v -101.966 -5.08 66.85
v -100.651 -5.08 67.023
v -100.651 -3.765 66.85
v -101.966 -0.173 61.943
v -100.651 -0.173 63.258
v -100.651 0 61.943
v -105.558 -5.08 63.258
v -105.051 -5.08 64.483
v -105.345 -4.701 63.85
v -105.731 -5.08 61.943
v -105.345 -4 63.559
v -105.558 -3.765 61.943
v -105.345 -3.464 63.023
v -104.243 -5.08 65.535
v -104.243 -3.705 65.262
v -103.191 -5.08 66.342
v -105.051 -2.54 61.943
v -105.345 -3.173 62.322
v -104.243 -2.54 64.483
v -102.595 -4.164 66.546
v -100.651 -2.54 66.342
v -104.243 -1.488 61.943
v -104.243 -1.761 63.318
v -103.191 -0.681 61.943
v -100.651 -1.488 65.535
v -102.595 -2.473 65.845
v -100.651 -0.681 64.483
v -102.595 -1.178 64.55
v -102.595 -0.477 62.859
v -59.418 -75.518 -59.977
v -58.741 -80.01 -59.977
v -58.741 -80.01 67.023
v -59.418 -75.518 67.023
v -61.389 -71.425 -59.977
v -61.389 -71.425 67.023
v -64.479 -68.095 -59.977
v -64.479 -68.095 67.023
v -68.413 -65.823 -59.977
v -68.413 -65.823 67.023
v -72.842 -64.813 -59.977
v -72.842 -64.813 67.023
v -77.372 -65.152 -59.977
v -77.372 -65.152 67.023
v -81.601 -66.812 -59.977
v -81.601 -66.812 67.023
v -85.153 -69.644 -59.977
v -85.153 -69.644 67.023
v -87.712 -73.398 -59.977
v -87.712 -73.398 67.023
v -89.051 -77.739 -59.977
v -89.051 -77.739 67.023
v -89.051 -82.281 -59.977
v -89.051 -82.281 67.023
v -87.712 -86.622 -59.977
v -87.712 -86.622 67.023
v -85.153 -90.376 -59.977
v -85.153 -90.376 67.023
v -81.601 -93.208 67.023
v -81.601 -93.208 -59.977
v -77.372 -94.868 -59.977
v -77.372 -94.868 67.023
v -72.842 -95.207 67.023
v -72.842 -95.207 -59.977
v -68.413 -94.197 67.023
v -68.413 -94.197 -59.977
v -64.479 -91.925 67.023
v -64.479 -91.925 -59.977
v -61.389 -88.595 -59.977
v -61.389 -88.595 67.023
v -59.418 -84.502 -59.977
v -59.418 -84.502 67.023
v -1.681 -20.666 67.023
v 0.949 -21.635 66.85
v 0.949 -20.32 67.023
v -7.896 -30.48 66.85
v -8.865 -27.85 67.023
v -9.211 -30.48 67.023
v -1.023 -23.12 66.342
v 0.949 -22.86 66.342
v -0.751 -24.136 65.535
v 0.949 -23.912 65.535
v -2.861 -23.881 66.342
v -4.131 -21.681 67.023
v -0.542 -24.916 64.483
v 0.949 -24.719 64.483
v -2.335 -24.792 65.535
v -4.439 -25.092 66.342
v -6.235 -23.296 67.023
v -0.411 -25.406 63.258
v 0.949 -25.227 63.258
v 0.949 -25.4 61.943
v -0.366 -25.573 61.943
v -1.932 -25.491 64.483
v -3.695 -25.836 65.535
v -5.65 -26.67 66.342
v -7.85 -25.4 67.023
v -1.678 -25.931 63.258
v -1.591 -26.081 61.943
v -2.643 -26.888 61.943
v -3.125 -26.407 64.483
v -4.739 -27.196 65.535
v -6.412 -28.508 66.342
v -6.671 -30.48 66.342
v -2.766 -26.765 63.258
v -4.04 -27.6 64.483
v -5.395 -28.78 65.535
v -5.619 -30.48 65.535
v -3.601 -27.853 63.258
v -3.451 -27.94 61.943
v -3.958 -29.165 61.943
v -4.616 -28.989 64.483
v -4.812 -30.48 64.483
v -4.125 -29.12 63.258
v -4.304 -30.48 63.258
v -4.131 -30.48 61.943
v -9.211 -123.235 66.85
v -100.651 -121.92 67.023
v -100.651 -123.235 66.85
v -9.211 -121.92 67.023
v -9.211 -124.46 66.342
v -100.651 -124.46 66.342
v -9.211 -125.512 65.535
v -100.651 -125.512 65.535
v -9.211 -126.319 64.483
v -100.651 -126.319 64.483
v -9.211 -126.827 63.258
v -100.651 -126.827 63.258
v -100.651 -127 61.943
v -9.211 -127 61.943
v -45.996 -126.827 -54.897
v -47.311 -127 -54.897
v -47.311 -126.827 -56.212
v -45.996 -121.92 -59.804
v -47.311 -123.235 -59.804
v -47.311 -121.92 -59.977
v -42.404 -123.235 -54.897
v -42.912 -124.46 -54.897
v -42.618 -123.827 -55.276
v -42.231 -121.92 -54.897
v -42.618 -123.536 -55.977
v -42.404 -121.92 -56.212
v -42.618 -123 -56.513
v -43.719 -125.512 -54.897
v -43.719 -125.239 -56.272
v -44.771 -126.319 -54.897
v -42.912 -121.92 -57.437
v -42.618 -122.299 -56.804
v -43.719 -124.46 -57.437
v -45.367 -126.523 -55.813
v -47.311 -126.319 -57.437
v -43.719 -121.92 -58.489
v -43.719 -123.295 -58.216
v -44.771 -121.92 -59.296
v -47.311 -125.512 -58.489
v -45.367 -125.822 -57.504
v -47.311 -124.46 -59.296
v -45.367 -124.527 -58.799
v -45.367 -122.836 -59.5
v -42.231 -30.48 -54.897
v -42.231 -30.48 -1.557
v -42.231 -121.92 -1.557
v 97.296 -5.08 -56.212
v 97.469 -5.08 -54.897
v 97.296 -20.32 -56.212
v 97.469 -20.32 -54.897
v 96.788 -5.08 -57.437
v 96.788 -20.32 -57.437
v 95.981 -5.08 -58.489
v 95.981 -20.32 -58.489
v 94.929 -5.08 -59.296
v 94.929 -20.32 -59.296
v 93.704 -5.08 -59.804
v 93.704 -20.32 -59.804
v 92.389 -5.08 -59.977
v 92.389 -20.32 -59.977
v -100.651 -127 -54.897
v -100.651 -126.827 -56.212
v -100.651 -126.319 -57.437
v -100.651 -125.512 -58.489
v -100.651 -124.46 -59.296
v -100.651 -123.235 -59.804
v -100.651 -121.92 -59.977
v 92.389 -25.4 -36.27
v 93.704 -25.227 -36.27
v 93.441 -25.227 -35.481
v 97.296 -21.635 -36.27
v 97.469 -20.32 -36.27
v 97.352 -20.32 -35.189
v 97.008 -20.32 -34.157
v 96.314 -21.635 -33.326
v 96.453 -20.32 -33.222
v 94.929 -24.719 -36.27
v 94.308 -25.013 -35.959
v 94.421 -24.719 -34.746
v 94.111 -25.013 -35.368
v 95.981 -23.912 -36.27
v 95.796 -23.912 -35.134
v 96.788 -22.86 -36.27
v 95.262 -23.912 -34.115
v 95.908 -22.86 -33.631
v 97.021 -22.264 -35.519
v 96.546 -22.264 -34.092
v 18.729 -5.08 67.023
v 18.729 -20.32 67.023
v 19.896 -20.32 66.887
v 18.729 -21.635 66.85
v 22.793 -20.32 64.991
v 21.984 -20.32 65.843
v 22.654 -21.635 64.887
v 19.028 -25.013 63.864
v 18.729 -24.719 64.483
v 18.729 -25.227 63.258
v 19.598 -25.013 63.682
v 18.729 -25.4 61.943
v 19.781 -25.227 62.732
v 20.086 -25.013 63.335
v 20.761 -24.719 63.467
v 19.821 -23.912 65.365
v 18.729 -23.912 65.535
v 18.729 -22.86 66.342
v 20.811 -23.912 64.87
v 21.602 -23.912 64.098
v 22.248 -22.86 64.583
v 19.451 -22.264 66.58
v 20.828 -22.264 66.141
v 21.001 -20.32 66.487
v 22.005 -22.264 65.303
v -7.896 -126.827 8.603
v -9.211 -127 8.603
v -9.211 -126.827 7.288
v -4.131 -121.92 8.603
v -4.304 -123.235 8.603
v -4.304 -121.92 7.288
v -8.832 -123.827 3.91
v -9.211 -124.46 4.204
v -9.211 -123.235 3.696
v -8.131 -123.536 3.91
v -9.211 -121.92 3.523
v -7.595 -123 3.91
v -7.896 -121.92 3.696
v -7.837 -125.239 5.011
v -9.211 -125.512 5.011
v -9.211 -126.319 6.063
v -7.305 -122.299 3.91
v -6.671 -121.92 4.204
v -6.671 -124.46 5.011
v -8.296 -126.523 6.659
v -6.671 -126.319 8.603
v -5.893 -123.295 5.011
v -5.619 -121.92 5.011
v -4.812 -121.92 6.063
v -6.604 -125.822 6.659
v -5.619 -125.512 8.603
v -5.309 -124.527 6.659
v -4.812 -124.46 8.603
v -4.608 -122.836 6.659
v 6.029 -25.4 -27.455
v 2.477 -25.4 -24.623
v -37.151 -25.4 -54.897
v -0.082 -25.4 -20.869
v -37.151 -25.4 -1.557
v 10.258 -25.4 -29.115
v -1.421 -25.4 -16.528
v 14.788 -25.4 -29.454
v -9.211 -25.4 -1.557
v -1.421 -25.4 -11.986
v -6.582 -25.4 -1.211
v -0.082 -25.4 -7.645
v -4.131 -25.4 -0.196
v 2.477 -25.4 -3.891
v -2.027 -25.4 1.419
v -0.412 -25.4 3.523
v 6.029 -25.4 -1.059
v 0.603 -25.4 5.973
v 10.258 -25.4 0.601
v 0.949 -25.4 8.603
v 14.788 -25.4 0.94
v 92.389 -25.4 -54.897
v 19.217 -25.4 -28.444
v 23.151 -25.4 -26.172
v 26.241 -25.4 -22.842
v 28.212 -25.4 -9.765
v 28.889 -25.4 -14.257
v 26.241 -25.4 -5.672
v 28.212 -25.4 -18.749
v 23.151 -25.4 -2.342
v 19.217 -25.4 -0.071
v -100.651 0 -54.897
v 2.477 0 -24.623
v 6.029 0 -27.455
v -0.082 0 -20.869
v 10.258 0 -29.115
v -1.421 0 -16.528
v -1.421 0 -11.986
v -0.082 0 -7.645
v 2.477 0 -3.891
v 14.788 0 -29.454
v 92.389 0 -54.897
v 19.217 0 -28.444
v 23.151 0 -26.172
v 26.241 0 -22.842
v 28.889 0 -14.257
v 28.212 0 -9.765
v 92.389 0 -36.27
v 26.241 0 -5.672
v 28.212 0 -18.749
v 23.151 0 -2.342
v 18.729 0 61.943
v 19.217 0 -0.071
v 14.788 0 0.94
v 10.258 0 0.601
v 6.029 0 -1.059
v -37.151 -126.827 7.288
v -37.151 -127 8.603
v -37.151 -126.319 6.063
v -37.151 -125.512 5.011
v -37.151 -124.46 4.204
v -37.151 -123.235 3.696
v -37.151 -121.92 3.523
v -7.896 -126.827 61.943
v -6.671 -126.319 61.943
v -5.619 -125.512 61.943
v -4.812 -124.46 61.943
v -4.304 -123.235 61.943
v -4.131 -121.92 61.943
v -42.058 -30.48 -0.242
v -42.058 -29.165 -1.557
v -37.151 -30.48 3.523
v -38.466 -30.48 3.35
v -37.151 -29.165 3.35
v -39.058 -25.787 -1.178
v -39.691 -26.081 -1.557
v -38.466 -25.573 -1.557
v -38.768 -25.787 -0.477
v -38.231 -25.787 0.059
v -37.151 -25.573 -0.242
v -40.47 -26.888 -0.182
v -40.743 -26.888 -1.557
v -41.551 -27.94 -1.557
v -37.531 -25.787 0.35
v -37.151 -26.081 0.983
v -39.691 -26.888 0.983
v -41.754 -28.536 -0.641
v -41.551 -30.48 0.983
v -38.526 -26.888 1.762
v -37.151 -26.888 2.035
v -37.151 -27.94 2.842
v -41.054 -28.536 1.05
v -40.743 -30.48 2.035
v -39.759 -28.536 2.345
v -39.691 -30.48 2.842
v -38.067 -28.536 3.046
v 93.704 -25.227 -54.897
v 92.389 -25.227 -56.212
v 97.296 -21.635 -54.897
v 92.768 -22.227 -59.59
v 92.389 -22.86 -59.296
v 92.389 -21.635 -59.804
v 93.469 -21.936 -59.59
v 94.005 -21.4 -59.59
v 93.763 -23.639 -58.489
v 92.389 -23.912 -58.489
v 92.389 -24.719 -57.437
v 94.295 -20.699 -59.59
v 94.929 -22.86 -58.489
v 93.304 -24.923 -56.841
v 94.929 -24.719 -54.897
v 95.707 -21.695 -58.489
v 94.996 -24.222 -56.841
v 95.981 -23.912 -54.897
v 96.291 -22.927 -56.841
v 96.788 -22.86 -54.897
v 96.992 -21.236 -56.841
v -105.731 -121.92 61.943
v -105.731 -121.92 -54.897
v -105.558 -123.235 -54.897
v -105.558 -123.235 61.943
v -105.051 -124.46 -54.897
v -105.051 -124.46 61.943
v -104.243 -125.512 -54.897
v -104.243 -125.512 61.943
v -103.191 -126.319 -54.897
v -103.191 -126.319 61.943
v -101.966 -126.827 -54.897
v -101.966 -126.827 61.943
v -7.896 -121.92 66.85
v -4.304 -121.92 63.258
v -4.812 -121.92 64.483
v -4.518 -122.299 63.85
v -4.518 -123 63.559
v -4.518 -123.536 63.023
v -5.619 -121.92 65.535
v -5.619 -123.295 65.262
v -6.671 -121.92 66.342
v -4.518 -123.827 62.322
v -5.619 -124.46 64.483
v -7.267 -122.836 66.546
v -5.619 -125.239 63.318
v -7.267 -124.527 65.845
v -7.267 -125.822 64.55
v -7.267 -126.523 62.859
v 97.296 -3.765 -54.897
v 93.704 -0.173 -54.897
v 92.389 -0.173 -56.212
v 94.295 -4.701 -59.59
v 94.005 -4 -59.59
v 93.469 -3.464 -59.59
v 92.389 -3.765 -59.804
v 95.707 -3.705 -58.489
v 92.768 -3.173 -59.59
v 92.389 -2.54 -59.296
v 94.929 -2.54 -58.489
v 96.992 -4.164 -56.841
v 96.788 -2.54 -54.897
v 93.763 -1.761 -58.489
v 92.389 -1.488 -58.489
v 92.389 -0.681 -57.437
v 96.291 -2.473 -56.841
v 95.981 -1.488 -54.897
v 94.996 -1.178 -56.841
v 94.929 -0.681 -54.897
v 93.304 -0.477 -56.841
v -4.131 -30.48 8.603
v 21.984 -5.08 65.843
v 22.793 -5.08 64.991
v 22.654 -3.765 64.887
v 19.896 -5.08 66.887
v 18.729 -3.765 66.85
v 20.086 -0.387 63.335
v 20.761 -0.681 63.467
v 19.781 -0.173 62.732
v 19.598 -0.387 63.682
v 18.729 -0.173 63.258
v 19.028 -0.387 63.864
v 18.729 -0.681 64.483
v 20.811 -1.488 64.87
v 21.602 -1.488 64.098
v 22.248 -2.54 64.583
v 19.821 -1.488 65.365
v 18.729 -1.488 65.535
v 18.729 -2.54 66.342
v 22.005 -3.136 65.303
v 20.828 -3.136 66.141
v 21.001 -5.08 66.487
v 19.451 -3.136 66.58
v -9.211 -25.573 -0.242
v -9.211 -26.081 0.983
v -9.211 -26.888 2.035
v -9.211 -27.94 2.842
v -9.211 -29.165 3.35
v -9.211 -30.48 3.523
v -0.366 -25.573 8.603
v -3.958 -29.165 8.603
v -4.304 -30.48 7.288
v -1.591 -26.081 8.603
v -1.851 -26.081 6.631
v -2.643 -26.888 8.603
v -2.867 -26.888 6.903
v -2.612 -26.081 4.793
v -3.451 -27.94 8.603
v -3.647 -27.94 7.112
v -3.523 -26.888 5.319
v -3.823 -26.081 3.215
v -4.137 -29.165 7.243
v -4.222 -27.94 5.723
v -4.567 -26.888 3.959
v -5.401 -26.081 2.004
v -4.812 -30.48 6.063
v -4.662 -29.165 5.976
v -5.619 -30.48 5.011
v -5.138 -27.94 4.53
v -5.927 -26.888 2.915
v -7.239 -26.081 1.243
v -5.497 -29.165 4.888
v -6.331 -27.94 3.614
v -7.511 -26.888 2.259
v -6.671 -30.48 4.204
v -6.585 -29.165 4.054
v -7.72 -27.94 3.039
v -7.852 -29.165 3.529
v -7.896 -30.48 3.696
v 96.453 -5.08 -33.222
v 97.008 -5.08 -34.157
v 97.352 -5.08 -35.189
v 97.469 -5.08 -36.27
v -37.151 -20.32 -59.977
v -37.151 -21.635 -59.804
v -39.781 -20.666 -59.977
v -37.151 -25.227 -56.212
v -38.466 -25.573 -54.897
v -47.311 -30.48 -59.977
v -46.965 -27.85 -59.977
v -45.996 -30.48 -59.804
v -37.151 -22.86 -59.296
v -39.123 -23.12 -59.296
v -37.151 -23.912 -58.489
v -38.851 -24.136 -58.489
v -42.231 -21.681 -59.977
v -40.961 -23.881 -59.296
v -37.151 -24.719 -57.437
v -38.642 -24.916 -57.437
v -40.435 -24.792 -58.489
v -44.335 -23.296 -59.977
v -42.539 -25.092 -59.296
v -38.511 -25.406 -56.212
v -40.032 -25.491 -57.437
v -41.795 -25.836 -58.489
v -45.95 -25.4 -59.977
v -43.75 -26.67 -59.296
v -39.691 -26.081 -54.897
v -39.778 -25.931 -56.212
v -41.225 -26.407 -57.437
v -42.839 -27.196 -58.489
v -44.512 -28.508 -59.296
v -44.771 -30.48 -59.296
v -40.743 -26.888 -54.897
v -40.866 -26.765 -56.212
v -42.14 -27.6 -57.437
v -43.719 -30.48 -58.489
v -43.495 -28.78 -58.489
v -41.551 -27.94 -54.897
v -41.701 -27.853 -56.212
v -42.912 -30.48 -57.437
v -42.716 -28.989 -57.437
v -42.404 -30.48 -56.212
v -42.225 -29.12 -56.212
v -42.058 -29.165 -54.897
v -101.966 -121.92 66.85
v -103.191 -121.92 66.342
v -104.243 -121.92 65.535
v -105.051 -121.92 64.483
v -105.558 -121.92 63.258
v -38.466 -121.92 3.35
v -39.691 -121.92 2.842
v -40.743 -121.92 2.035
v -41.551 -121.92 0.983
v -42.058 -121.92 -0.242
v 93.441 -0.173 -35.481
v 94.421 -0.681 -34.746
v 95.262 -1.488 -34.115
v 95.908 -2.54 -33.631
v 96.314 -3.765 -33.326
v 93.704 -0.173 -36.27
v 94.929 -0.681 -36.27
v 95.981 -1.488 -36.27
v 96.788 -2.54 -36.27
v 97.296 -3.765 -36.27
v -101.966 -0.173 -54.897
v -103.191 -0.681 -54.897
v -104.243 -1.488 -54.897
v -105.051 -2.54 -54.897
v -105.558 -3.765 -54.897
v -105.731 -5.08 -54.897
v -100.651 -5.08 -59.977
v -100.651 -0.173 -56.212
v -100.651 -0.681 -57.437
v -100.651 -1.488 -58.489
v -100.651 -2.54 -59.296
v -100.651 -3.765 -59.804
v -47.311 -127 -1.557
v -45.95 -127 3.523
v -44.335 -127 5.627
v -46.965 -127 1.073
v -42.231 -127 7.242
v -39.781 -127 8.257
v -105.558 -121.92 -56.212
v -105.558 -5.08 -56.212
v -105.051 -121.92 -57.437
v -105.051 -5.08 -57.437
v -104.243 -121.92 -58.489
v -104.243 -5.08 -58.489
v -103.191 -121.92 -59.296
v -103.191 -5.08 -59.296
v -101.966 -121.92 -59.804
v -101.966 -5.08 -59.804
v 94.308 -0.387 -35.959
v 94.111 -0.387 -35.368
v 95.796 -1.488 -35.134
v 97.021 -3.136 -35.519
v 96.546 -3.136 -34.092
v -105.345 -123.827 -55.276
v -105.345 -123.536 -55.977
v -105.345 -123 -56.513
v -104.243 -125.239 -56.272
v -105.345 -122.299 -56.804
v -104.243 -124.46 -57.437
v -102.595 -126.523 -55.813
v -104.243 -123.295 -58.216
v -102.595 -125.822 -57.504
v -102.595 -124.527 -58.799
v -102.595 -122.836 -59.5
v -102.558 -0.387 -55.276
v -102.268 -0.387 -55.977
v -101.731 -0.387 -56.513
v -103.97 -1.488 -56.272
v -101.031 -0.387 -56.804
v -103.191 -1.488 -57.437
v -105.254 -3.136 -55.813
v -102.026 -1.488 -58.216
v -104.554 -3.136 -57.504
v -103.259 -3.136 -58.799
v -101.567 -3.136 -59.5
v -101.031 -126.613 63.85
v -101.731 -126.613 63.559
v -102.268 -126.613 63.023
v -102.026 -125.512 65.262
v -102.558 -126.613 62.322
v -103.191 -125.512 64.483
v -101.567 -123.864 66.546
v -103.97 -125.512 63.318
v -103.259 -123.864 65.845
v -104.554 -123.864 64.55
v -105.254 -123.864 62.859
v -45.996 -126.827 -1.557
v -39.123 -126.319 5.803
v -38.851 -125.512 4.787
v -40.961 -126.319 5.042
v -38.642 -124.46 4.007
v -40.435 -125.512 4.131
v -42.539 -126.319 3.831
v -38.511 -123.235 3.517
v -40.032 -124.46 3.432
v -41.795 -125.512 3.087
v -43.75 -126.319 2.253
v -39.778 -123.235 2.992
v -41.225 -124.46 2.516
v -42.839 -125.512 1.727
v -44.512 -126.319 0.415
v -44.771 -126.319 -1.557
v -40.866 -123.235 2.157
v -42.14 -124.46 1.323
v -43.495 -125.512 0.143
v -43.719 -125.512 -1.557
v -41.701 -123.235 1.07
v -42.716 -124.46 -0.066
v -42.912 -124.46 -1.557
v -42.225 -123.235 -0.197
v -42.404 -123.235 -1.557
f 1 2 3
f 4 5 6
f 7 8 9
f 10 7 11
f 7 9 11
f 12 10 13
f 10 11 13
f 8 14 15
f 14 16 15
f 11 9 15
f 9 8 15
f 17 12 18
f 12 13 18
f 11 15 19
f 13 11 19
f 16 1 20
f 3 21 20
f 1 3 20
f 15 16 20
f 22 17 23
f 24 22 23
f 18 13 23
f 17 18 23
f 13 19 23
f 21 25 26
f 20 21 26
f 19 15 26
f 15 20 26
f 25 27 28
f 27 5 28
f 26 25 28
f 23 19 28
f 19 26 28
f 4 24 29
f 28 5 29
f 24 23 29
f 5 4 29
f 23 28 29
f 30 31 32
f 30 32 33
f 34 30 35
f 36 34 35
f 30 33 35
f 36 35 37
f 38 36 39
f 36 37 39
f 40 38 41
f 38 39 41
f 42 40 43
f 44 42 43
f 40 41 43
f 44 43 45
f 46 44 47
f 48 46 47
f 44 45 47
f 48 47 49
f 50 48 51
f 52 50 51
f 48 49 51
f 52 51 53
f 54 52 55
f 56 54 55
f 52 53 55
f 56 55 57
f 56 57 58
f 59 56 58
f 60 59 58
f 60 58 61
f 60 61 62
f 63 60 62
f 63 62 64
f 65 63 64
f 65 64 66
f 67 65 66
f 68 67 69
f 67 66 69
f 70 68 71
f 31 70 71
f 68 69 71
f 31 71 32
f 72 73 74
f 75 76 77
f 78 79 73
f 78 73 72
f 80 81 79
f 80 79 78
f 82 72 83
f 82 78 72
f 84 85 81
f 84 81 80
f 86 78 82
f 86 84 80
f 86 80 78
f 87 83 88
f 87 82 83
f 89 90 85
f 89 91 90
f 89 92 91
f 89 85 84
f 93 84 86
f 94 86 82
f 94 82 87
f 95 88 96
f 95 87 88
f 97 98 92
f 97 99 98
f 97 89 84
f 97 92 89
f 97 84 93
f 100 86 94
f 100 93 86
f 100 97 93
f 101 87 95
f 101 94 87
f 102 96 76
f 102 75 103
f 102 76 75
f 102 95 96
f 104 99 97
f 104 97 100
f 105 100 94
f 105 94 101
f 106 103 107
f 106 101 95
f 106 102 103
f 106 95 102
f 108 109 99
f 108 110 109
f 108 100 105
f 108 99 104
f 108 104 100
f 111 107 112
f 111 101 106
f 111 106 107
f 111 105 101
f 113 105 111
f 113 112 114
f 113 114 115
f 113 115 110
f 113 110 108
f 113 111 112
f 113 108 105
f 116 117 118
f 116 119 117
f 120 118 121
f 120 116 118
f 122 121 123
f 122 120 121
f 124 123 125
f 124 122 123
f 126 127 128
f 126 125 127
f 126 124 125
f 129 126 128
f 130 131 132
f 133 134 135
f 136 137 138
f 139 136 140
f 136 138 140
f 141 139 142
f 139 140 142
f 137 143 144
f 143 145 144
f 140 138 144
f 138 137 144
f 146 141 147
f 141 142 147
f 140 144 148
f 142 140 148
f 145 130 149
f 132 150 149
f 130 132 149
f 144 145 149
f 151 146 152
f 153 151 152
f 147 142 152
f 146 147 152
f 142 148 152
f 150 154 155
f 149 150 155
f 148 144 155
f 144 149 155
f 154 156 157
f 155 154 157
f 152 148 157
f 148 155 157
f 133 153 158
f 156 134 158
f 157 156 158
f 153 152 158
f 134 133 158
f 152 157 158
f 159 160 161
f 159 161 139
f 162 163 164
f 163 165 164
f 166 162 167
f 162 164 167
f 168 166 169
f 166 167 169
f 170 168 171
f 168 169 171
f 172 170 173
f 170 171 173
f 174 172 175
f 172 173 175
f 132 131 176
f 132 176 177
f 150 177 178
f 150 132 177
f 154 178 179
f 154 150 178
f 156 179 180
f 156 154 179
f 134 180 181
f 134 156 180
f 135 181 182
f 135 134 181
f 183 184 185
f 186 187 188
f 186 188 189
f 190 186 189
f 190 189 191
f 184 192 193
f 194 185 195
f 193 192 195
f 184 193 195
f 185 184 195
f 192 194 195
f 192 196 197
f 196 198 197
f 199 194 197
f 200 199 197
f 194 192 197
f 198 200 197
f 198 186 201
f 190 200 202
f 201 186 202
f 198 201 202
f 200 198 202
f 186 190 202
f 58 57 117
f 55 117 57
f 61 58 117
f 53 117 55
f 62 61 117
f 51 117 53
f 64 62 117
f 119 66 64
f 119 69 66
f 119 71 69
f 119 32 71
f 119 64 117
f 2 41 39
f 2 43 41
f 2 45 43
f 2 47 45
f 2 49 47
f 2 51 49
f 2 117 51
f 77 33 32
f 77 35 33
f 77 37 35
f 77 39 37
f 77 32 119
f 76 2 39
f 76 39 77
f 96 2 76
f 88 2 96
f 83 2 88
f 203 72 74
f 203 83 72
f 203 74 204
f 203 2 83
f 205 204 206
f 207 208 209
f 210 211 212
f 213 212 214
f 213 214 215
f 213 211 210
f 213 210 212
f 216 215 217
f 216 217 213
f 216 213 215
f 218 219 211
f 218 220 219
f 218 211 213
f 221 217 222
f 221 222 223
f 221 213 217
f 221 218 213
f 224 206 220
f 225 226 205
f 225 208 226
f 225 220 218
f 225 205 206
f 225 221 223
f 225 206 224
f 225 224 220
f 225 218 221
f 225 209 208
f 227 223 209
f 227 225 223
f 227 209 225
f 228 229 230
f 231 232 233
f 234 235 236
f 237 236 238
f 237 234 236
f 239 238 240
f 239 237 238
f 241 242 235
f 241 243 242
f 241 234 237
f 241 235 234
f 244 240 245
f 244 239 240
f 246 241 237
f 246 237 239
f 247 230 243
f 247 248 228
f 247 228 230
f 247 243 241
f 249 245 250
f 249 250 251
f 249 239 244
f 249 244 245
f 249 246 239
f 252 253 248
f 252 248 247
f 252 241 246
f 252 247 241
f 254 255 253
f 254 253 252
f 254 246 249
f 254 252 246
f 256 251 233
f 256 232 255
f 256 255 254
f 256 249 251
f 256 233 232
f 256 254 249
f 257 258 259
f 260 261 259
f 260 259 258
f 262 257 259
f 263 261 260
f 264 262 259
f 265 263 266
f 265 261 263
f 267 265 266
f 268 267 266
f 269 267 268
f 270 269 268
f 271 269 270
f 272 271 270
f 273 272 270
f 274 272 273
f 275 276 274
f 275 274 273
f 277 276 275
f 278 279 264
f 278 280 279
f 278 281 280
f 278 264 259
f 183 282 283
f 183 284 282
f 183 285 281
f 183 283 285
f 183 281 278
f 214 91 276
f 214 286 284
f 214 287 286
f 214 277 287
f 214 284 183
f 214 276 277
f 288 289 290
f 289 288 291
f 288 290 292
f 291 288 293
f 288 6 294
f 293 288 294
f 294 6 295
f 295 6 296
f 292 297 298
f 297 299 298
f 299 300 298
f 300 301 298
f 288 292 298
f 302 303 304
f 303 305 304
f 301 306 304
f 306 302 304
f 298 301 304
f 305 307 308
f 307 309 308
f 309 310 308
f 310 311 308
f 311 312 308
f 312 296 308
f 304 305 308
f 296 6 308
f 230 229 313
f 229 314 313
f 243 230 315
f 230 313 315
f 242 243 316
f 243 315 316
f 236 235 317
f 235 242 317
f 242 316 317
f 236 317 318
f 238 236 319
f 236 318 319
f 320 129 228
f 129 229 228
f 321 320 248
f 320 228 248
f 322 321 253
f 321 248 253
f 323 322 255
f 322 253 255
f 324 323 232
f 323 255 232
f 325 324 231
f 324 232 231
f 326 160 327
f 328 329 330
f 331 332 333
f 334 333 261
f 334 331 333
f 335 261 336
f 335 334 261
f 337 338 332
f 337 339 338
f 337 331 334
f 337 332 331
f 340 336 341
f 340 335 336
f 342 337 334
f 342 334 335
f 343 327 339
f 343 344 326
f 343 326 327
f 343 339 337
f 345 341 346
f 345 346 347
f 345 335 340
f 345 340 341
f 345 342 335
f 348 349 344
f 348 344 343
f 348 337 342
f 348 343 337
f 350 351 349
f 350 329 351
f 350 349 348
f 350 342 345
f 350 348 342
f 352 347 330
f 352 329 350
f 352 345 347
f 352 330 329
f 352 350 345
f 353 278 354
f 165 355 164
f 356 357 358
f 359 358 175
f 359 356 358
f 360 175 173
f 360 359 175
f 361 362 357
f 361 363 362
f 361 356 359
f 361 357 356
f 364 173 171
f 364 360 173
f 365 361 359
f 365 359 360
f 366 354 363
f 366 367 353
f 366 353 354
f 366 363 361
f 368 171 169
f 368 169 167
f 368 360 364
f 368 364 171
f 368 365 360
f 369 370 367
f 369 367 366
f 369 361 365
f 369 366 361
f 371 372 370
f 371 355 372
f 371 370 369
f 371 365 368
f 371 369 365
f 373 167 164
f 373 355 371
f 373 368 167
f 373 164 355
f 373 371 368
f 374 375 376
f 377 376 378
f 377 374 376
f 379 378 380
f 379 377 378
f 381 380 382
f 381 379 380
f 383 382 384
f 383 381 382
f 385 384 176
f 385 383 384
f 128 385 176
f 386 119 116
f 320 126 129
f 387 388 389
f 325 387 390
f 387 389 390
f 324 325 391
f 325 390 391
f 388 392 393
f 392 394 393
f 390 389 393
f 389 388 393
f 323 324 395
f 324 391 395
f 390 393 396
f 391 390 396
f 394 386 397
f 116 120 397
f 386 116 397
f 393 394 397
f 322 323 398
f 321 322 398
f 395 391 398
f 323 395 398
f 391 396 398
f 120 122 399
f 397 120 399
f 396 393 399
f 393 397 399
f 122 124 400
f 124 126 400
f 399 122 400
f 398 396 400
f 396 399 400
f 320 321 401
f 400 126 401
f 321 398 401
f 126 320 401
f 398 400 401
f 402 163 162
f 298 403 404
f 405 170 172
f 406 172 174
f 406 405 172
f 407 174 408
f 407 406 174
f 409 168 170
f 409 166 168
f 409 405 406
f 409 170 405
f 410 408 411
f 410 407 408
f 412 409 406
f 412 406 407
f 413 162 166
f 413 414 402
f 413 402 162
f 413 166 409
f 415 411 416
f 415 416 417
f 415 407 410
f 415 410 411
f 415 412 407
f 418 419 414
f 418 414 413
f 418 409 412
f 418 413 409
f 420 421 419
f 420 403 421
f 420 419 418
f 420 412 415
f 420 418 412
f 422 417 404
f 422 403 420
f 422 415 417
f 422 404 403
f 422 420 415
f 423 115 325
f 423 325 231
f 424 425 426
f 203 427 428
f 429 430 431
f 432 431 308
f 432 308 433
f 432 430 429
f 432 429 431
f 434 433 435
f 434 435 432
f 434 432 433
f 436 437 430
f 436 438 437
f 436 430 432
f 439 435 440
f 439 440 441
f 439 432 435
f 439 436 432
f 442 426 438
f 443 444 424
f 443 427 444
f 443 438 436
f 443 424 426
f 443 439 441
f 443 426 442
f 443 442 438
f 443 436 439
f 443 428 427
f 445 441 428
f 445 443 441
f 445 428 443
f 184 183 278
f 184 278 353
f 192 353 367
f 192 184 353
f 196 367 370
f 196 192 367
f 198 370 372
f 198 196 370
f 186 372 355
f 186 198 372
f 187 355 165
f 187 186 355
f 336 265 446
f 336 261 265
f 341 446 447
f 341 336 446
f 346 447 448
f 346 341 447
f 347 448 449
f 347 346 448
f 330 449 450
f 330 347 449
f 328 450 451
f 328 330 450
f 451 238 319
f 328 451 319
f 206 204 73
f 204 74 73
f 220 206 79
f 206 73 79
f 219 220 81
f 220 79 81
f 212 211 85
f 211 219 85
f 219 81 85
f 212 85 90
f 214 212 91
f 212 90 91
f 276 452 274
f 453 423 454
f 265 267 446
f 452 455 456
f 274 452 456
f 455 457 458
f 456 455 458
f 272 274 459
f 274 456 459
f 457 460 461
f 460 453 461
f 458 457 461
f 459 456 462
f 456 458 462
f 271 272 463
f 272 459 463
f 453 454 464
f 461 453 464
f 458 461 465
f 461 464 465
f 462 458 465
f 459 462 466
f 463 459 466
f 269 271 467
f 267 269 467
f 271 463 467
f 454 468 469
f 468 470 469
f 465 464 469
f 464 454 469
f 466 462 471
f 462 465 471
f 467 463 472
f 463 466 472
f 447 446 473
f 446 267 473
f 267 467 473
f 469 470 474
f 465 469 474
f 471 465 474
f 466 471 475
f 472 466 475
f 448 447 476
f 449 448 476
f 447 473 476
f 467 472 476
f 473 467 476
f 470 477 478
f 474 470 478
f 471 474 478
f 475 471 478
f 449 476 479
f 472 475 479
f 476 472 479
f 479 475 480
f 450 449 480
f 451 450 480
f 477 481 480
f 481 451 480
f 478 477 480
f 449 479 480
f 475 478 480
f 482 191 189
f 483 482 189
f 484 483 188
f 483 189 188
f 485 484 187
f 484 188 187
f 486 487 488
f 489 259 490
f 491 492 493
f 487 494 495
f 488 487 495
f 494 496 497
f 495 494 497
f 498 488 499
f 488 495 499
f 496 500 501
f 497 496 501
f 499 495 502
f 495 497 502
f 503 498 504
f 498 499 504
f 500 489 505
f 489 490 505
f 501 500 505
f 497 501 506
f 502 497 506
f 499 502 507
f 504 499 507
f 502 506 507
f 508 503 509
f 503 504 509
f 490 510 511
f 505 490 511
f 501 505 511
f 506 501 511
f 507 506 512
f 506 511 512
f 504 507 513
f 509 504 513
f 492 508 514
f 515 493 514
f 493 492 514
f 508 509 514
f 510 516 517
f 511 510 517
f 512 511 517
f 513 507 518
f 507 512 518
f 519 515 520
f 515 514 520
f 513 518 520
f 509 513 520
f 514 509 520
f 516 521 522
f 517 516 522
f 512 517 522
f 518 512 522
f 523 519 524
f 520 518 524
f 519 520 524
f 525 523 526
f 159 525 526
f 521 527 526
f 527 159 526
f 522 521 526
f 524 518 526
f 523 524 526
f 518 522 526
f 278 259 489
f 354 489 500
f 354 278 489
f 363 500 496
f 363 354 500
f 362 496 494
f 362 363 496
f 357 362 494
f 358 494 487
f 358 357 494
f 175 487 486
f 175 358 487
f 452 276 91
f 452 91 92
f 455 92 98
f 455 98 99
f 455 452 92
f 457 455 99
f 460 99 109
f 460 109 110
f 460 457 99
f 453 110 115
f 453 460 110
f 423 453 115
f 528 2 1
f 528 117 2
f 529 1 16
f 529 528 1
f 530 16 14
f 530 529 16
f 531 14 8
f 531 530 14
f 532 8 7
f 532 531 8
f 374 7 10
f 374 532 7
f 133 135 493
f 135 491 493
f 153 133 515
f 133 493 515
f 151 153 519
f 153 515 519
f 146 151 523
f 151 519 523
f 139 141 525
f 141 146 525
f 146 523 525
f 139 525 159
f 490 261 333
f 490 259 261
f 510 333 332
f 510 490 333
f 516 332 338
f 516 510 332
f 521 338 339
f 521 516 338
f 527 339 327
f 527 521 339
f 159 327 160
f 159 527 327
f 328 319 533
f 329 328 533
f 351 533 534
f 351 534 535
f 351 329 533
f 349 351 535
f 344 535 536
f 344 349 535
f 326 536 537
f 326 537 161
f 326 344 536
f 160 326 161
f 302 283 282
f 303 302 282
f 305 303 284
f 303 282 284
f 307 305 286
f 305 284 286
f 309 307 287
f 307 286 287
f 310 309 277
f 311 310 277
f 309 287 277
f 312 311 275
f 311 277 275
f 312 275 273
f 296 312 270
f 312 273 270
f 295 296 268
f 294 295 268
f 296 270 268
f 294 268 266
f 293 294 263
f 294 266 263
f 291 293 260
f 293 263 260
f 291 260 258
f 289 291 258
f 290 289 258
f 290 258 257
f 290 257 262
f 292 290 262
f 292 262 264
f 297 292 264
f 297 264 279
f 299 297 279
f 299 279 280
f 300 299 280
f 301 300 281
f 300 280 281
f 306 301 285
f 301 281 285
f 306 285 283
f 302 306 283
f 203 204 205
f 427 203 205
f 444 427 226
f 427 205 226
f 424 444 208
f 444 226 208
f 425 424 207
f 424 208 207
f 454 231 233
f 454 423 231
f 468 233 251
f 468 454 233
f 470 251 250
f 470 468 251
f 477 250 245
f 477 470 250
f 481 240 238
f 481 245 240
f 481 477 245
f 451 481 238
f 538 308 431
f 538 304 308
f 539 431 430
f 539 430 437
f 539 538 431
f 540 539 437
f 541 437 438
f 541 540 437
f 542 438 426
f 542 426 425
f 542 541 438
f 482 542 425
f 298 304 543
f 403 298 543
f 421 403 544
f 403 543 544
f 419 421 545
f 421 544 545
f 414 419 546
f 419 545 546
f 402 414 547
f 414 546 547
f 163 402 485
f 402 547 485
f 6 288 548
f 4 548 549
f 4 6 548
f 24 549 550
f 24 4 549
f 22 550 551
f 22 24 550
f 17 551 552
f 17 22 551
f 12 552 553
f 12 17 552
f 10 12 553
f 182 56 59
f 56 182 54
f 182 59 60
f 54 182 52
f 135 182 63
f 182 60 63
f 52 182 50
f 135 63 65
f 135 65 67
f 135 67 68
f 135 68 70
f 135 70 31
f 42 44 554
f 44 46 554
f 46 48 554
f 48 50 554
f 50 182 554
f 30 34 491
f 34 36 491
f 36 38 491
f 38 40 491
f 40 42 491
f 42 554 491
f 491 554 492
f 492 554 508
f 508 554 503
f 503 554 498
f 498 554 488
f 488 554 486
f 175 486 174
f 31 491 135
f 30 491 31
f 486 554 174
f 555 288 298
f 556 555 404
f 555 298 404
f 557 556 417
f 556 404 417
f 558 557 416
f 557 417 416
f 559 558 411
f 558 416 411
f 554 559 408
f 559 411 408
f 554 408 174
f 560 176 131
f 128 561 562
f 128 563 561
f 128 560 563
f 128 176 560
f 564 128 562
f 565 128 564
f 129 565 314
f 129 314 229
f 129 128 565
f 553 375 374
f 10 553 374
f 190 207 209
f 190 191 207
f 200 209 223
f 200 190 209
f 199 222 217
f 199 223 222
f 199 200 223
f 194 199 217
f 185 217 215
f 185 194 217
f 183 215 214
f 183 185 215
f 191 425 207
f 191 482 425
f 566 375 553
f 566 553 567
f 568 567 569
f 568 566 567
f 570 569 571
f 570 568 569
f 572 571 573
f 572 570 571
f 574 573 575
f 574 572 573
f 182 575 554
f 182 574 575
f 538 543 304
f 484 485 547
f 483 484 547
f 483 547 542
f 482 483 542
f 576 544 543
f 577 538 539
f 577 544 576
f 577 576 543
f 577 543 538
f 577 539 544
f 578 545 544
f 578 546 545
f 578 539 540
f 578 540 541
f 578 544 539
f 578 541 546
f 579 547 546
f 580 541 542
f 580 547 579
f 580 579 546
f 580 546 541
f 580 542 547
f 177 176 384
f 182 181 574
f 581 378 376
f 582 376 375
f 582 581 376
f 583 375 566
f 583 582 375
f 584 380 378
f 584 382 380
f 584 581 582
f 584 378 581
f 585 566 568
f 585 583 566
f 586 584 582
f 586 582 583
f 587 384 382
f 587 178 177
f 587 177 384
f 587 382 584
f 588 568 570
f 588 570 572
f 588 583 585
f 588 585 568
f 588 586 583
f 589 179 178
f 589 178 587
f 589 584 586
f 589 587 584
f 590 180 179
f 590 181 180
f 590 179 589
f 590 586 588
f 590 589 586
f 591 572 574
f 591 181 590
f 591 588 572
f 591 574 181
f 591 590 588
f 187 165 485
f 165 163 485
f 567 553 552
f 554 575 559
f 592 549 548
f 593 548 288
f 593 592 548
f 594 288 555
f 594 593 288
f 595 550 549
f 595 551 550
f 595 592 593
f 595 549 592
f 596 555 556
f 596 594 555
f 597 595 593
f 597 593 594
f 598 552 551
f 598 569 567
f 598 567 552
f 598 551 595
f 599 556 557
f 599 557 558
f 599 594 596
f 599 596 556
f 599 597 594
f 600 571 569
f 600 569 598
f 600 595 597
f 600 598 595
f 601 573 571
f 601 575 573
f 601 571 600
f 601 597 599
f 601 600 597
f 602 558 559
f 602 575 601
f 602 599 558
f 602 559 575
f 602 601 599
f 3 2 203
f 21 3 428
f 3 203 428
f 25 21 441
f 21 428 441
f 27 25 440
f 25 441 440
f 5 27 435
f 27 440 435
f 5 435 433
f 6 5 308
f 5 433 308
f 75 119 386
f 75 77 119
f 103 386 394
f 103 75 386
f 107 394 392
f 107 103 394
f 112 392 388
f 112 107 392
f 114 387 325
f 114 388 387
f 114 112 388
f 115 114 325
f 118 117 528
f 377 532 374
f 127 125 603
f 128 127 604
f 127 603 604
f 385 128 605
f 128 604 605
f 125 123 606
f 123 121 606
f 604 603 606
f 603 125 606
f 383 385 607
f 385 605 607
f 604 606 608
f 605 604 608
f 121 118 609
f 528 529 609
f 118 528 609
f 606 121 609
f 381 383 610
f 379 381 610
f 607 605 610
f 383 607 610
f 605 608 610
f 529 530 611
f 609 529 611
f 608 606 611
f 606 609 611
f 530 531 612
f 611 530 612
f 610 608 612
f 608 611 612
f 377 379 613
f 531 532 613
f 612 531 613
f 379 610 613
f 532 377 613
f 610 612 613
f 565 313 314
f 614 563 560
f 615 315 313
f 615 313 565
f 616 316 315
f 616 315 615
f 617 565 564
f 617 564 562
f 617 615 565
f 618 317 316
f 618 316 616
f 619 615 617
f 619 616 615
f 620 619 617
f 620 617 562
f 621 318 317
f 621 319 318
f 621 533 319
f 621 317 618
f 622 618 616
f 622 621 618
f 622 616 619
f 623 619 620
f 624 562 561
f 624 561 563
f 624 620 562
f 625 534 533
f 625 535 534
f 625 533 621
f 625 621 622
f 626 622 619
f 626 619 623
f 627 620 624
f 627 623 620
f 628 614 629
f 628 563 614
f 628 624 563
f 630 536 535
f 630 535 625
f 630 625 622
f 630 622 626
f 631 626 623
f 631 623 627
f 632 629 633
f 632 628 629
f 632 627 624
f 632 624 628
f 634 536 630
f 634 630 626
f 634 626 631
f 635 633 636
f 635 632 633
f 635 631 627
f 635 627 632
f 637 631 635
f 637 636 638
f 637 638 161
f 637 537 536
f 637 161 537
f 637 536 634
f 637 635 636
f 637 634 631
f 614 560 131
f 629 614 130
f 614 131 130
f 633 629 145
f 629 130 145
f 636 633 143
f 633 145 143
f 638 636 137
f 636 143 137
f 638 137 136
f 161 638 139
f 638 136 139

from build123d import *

# Parameters (mm, degrees)
F0_W     = 203.2
F0_H     = 127
F1_DEPTH = 127
F3_DEPTH = 101.6
F4_SIZE2 = 101.6
F4_SIZE  = 76.2
F5_R     = 5.08
F6_R     = 15.24
F7_DEPTH = 25.4
F8_R     = 15.24
F9_DEPTH = 127


with BuildPart() as f1:
    # F0 (on Front) → F1 (new body)
    with BuildSketch(Plane.XZ):
        with Locations((-4.1312798858, 3.5229725738)):
            Rectangle(F0_W, F0_H)
    extrude(amount=F1_DEPTH)

    # F2 (on face) → F3 (cut)
    with BuildSketch(Plane.XZ.offset(127)):
        Polygon((97.4687201142, 67.0229725738), (-4.1312798858, 67.0229725738), (-4.1312798858, 3.5229718778), (-42.2312798858, 3.5229718778), (-42.2312798858, -59.9770274262), (97.4687201142, -59.9770274262), align=None)
    extrude(amount=-F3_DEPTH, mode=Mode.SUBTRACT)

    # F4
    f4_edges = [f1.edges().sort_by_distance(p)[0] for p in [
        (97.46872, -12.7, 67.022973),
    ]]
    f4_side = f1.faces().sort_by_distance((-37.997947, -55.033333, 67.022973))[0]
    chamfer(f4_edges, length=F4_SIZE, length2=F4_SIZE2, reference=f4_side)

    # F5
    f5_edges = [f1.edges().sort_by_distance(p)[0] for p in [
        (-42.23128, 0, 67.022973),
        (21.26872, -12.7, 67.022973),
        (-105.73128, -63.5, 67.022973),
        (8.56872, -25.4, 67.022973),
        (-54.93128, -127, 67.022973),
        (-4.13128, -76.2, 67.022973),
        (-73.98128, -127, -59.977027),
        (-105.73128, -127, 3.522973),
        (-4.13128, -127, 35.272972),
        (-23.18128, -127, 3.522972),
        (-42.23128, -127, -28.227028),
        (-4.13128, -76.2, 3.522972),
        (-4.13128, -25.4, 35.272972),
        (-42.23128, -76.2, 3.522972),
        (-42.23128, -76.2, -59.977027),
        (-42.23128, -25.4, -28.227028),
        (97.46872, -25.4, -47.277027),
        (59.36872, -25.4, 16.222973),
        (27.61872, -25.4, -59.977027),
        (-23.18128, -25.4, 3.522972),
        (59.36872, 0, 16.222973),
        (97.46872, -12.7, -34.577027),
        (97.46872, 0, -47.277027),
        (97.46872, -12.7, -59.977027),
        (-105.73128, -63.5, -59.977027),
        (-105.73128, 0, 3.522973),
        (-4.13128, 0, -59.977027),
    ]]
    fillet(f5_edges, radius=F5_R)

    # F6 (on face) → F7 (cut)
    with BuildSketch(Plane.XZ.offset(25.4)):
        with Locations((13.6487201142, -14.2570274262)):
            Circle(F6_R)
    extrude(amount=-F7_DEPTH, mode=Mode.SUBTRACT)

    # F8 (on face) → F9 (cut)
    with BuildSketch(Plane.XY.offset(67.0229725738)):
        with Locations((-73.9812798858, -80.01)):
            Circle(F8_R)
    extrude(amount=-F9_DEPTH, mode=Mode.SUBTRACT)


solid = f1.part
